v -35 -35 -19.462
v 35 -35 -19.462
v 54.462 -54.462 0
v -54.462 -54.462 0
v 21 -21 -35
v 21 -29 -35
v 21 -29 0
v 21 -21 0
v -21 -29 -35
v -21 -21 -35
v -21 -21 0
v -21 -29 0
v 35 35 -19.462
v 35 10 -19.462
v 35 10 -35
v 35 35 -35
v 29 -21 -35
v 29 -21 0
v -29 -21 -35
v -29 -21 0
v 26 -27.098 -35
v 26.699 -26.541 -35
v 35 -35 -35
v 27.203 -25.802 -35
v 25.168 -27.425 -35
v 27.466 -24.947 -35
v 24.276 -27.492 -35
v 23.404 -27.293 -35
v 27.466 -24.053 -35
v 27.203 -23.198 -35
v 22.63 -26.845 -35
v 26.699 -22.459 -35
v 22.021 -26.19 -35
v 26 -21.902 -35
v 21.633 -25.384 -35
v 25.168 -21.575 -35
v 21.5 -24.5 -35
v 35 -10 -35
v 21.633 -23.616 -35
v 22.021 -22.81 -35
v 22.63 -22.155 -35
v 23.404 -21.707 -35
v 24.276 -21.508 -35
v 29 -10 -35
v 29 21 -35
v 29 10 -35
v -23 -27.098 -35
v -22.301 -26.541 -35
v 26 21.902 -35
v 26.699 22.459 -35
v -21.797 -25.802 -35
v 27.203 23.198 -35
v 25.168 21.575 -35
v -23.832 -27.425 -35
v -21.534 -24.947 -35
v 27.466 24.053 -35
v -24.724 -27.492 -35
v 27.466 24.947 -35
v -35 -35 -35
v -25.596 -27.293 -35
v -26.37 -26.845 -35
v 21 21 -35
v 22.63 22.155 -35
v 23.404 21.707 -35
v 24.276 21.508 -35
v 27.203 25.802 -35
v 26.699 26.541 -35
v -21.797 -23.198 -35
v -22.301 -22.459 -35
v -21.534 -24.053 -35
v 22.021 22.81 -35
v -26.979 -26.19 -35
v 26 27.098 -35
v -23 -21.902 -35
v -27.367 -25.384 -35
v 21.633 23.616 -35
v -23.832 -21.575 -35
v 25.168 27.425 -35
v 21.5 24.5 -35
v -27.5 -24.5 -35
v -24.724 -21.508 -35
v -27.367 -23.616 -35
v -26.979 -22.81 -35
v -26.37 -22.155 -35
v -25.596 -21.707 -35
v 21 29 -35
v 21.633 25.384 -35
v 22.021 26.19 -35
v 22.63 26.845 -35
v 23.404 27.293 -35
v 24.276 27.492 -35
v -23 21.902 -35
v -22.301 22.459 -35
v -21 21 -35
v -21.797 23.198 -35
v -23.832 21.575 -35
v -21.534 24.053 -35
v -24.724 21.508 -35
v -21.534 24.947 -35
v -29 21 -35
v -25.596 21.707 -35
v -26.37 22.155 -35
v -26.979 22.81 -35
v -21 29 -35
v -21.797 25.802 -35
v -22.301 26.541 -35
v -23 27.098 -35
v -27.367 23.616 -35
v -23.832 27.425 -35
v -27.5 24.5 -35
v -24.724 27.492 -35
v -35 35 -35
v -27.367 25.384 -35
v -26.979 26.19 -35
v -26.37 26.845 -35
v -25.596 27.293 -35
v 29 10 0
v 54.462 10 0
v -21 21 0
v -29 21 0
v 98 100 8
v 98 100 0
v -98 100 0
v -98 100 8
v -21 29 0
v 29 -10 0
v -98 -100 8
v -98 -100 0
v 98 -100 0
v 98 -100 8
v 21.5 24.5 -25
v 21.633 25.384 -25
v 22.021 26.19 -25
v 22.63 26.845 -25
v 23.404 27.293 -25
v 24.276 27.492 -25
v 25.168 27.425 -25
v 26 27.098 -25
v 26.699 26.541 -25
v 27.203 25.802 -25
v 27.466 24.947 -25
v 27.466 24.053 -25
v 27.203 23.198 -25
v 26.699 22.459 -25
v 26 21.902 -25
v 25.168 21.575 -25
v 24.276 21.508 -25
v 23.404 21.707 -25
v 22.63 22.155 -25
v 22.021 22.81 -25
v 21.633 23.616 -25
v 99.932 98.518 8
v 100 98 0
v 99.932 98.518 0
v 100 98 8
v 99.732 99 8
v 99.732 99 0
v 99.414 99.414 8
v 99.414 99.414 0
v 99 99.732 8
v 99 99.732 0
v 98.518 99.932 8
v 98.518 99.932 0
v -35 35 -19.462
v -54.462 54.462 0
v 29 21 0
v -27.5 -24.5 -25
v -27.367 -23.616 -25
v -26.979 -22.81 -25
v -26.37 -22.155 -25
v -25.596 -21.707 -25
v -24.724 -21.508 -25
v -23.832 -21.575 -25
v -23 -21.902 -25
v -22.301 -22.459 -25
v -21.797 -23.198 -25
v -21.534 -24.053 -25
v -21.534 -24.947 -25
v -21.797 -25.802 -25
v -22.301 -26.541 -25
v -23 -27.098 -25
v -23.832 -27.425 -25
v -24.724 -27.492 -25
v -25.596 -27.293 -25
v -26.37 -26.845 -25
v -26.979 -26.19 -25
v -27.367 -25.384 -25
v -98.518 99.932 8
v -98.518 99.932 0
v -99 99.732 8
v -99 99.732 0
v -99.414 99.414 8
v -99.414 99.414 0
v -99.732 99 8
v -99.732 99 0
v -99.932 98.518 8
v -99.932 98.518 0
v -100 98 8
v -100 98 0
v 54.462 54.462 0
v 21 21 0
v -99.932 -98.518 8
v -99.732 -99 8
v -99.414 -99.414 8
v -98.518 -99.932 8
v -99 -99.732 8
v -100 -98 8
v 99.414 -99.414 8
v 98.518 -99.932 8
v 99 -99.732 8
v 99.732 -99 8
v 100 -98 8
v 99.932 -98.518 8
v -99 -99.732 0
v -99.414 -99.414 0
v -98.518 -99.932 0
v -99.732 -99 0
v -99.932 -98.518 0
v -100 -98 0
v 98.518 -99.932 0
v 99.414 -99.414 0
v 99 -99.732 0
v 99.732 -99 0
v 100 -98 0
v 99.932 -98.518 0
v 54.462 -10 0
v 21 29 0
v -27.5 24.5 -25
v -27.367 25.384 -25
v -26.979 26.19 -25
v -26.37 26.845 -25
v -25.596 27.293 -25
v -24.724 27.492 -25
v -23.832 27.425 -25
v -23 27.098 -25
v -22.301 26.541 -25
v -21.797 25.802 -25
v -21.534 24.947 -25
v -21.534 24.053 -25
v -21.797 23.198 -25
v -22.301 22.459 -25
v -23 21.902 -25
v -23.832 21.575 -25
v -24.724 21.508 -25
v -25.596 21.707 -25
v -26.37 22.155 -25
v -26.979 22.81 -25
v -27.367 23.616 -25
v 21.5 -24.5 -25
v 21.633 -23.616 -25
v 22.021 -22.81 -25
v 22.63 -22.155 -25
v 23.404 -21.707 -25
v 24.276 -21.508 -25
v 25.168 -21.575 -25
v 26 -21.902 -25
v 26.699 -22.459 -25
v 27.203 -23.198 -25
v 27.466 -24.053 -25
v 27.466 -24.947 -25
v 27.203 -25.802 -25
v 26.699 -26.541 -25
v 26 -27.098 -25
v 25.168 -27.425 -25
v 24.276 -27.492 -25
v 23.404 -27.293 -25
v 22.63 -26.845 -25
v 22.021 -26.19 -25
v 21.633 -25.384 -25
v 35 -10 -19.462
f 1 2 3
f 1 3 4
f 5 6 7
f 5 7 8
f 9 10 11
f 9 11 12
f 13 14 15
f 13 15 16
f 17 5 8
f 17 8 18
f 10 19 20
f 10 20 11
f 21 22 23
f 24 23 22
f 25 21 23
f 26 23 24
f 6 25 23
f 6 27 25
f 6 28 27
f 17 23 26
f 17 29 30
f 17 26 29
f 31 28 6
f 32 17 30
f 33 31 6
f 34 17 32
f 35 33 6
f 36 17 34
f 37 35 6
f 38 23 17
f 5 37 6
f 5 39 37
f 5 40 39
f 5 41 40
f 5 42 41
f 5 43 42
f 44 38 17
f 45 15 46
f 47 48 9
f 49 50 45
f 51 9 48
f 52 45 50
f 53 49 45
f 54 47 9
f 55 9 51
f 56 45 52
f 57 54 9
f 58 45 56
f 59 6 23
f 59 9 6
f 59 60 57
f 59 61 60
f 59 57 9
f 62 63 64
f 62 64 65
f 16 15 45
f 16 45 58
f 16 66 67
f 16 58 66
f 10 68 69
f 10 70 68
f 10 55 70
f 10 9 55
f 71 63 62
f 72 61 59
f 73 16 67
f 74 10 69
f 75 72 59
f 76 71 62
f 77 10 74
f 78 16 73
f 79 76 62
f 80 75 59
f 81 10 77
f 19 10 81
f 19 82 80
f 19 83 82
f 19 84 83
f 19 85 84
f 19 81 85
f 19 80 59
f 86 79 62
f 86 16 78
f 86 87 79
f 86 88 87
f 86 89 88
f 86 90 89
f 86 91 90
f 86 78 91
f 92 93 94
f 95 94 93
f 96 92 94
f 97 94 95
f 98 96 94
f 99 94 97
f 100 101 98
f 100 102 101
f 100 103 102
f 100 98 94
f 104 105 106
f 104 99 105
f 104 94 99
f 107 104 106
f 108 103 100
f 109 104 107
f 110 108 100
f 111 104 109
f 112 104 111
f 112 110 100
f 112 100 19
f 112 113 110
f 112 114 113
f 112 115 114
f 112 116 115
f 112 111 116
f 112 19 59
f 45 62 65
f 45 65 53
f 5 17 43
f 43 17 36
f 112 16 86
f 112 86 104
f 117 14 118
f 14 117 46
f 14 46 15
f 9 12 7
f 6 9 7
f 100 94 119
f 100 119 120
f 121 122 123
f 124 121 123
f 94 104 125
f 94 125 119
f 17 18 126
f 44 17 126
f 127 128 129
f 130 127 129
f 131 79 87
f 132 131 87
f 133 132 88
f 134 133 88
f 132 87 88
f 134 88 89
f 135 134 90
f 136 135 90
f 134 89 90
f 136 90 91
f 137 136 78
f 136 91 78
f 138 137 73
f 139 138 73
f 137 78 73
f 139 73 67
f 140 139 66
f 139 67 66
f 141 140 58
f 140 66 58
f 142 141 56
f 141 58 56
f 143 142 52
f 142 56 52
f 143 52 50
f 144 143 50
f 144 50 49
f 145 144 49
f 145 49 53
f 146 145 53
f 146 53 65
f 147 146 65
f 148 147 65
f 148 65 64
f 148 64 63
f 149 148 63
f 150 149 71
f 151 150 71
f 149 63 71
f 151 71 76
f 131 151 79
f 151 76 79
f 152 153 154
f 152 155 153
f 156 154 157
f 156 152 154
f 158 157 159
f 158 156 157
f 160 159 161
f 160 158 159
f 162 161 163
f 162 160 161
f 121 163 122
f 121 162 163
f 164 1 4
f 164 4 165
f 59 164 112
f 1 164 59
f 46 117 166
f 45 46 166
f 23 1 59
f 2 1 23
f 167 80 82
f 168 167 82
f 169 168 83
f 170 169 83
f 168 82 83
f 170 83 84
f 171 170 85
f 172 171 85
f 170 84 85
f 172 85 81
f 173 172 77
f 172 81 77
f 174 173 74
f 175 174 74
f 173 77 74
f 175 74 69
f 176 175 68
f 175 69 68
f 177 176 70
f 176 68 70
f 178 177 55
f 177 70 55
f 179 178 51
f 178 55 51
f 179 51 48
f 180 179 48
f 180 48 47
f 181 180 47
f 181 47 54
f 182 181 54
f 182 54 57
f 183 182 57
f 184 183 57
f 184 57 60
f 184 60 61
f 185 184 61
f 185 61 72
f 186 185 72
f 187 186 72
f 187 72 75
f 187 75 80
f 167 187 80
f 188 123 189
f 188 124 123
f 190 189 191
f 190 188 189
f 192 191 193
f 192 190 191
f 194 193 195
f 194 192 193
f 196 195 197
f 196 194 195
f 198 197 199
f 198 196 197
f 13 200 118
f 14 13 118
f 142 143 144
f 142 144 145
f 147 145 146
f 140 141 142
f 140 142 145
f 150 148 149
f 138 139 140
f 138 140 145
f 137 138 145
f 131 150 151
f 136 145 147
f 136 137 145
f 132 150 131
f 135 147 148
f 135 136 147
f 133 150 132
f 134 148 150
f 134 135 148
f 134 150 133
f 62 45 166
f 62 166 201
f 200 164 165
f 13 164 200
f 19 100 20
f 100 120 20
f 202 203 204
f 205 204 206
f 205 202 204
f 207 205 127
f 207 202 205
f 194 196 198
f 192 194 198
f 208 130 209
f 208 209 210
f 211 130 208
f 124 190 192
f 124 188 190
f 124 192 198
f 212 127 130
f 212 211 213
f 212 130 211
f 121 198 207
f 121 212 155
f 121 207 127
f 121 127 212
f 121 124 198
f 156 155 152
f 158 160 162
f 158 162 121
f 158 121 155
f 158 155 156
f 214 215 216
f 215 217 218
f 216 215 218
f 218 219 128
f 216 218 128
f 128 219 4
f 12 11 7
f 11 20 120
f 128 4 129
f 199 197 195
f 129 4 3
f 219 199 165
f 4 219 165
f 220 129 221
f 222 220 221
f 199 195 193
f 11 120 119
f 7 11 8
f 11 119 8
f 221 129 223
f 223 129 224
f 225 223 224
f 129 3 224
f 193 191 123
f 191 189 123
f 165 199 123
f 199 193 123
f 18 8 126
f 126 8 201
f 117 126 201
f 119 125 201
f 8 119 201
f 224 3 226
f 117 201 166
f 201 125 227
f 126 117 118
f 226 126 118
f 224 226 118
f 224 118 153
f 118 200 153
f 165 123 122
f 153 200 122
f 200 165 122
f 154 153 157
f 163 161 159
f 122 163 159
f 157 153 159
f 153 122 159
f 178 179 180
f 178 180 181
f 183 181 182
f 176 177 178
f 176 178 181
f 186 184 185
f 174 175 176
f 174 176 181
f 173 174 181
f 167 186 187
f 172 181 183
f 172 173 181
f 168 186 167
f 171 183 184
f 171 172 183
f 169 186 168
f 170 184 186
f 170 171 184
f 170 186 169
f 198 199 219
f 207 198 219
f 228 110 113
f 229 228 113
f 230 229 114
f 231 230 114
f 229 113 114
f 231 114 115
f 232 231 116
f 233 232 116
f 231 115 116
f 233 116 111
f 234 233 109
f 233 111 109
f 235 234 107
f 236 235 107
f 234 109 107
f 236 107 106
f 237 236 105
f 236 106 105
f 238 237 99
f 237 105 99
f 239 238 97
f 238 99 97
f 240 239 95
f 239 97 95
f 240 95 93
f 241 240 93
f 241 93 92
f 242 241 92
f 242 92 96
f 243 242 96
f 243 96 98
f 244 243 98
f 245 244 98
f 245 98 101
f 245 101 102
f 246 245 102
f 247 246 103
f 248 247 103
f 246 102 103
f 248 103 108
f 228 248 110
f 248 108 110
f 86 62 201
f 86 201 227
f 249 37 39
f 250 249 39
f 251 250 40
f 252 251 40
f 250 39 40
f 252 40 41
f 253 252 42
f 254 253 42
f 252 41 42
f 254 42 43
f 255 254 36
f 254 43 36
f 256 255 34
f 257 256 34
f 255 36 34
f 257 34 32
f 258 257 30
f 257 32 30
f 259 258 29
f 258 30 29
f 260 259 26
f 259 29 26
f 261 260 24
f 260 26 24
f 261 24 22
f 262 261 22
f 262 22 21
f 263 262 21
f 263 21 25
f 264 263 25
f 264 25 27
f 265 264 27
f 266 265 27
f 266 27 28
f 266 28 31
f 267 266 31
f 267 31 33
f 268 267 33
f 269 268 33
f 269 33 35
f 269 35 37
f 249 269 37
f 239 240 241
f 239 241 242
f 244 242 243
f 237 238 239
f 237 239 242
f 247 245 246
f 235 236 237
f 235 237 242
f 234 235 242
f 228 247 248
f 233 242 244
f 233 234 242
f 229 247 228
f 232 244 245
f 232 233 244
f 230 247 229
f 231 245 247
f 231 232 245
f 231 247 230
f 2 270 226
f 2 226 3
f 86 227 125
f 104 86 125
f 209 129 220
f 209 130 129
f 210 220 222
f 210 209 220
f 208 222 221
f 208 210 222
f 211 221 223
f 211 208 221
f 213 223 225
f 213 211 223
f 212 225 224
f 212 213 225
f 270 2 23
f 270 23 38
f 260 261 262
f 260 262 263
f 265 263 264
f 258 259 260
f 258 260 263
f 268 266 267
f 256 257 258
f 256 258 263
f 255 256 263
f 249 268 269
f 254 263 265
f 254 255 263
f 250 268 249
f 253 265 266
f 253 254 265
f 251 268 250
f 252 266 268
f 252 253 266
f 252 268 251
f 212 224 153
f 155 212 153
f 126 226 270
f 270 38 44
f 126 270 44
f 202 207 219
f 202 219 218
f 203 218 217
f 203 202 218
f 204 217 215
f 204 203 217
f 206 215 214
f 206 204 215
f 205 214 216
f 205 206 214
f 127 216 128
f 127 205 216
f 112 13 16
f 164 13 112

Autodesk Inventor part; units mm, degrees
ref_plane "YZ Plane" through (0, 0, 0) normal (1, 0, 0) x (0, 1, 0)
ref_plane "XZ Plane" through (0, 0, 0) normal (0, 1, 0) x (-1, 0, 0)
ref_plane "XY Plane" through (0, 0, 0) normal (0, 0, 1) x (1, 0, 0)
sketch "Sketch1" plane through (0, 0, 0) normal (0, 0, 1) x (1, 0, 0)
  line L0 (20.5, -20.5) -> (20.5, -28.5) projected
  line L1 (28.5, -20.5) -> (20.5, -20.5) projected
  line L2 (28.5, 20.5) -> (28.5, -20.5) projected
  line L3 (20.5, 20.5) -> (28.5, 20.5) projected
  line L4 (20.5, 28.5) -> (20.5, 20.5) projected
  line L5 (-20.5, 28.5) -> (20.5, 28.5) projected
  line L6 (-20.5, 20.5) -> (-20.5, 28.5) projected
  line L7 (-28.5, 20.5) -> (-20.5, 20.5) projected
  line L8 (-28.5, -20.5) -> (-28.5, 20.5) projected
  line L9 (-20.5, -20.5) -> (-28.5, -20.5) projected
  line L10 (-20.5, -28.5) -> (-20.5, -20.5) projected
  line L11 (20.5, -28.5) -> (-20.5, -28.5) projected
  line L12 (-100, -100) -> (100, -100)
  line L13 (100, -100) -> (100, 100)
  line L14 (100, 100) -> (-100, 100)
  line L15 (-100, 100) -> (-100, -100)
  line L16 (-100, -100) -> (100, 100) construction
  line L17 (100, -100) -> (-100, 100) construction
  point P0 (0, 0)
  dimension "d0" = 200
  dimension "d1" = 200
extrude "Extrusion1" add sketch "Sketch1" along normal blind 8 contours L0 L11 L10 L9 L8 L7 L6 L5 L4 L3 L2 L1 | L15 L14 L13 L12
sketch "Sketch2" plane through (0, 0, 0) normal (0, 0, -1) x (-1, 0, 0)
  line L0 (28.5, -20.5) -> (28.5, 20.5) projected
  line L1 (28.5, 20.5) -> (20.5, 20.5) projected
  line L2 (20.5, 20.5) -> (20.5, 28.5) projected
  line L3 (20.5, 28.5) -> (-20.5, 28.5) projected
  line L4 (-20.5, 28.5) -> (-20.5, 20.5) projected
  line L5 (-20.5, 20.5) -> (-28.5, 20.5) projected
  line L6 (-28.5, 20.5) -> (-28.5, -20.5) projected
  line L7 (-28.5, -20.5) -> (-20.5, -20.5) construction
  line L8 (-20.5, -20.5) -> (-20.5, -28.5) construction
  line L9 (-28.5, -20.5) -> (-20.5, -20.5) construction
  line L10 (-28.5, -20.5) -> (-20.5, -20.5) construction
  line L11 (-20.5, -28.5) -> (20.5, -28.5) construction
  line L12 (20.5, -20.5) -> (28.5, -20.5) projected
  line L13 (20.5, -28.5) -> (20.5, -20.5) projected
  line L14 (-35, 35) -> (35, 35)
  line L15 (35, 35) -> (35, -35)
  line L16 (35, -35) -> (-35, -35)
  line L17 (-35, -35) -> (-35, 35)
  line L18 (-35, 35) -> (35, -35) construction
  line L19 (35, 35) -> (-35, -35) construction
  line L20 (-21, -29) -> (-21, -21)
  line L21 (-21, -21) -> (-29, -21)
  line L22 (-29, -21) -> (-29, 21)
  line L23 (-29, 21) -> (-21, 21)
  line L24 (-21, 21) -> (-21, 29)
  line L25 (-21, 29) -> (21, 29)
  line L26 (21, 29) -> (21, 21)
  line L27 (21, 21) -> (29, 21)
  line L28 (29, 21) -> (29, -21)
  line L29 (29, -21) -> (21, -21)
  line L30 (21, -21) -> (21, -29)
  line L31 (21, -29) -> (-21, -29)
  point P0 (0, 0)
  dimension "d4" = 70
  dimension "d5" = 70
  dimension "d6" = 0.5
extrude "Extrusion2" add sketch "Sketch2" along normal blind 35
sketch "Sketch3" plane through (0, 0, -35) normal (0, 0, -1) x (-1, 0, 0)
  line L0 (-35, -35) -> (35, -35) projected
  line L1 (35, -35) -> (35, 35) projected
  line L2 (35, 35) -> (-35, 35) projected
  line L3 (-35, 35) -> (-35, -35) projected
  line L4 (-21, -29) -> (-21, -21) projected
  line L5 (-21, -21) -> (-29, -21) projected
  line L6 (-29, -21) -> (-29, 21) projected
  line L7 (-29, 21) -> (-21, 21) projected
  line L8 (-21, 21) -> (-21, 29) projected
  line L9 (-21, 29) -> (21, 29) projected
  line L10 (21, 29) -> (21, 21) projected
  line L11 (21, 21) -> (29, 21) projected
  line L12 (29, 21) -> (29, -21) projected
  line L13 (29, -21) -> (21, -21) projected
  line L14 (21, -21) -> (21, -29) projected
  line L15 (21, -29) -> (-21, -29) projected
  line L16 (-29, 0) -> (-29, 10)
  line L17 (-29, -21) -> (-29, 21) projected
  line L18 (-29, 10) -> (-29, -10)
  line L19 (-29, 10) -> (-35, 10)
  line L20 (-35, 10) -> (-35, -10)
  line L21 (-35, -10) -> (-29, -10)
  line L22 (-29, -10) -> (-29, 10)
  point P0 (0, 0)
  dimension "d9" = 10
  dimension "d10" = 20
extrude "Extrusion3" cut sketch "Sketch3" against normal blind 35 contours L3 L19 L6 L21
chamfer "Chamfer1" distance 19.4625 angle 45 5 edges at (35, 22.5, 0) (35, -22.5, 0) (0, -35, 0) (-35, 0, 0) (0, 35, 0)
sketch "Sketch4" plane through (0, 0, -35) normal (0, 0, -1) x (-1, 0, 0)
  circle A0 centre (24.5, 24.5) radius 2.5 projected
  circle A1 centre (24.5, -24.5) radius 2.5 projected
  circle A2 centre (-24.5, -24.5) radius 2.5 projected
  circle A3 centre (-24.5, 24.5) radius 2.5 projected
  circle A4 centre (24.5, 24.5) radius 3
  circle A5 centre (-24.5, 24.5) radius 3
  circle A6 centre (-24.5, -24.5) radius 3
  circle A7 centre (24.5, -24.5) radius 3
  point P0 (0, 0)
  dimension "d16" = 6
  dimension "d17" = 6
  dimension "d18" = 6
  dimension "d19" = 6
extrude "Extrusion4" cut sketch "Sketch4" against normal blind 10 contours A0 | A1 | A2 | A3 | A4 | A5 | A6 | A7
fillet "Fillet1" radius 2 4 edges at (100, 100, 4) (100, -100, 4) (-100, -100, 4) (-100, 100, 4)
properties part number "Base stand"
